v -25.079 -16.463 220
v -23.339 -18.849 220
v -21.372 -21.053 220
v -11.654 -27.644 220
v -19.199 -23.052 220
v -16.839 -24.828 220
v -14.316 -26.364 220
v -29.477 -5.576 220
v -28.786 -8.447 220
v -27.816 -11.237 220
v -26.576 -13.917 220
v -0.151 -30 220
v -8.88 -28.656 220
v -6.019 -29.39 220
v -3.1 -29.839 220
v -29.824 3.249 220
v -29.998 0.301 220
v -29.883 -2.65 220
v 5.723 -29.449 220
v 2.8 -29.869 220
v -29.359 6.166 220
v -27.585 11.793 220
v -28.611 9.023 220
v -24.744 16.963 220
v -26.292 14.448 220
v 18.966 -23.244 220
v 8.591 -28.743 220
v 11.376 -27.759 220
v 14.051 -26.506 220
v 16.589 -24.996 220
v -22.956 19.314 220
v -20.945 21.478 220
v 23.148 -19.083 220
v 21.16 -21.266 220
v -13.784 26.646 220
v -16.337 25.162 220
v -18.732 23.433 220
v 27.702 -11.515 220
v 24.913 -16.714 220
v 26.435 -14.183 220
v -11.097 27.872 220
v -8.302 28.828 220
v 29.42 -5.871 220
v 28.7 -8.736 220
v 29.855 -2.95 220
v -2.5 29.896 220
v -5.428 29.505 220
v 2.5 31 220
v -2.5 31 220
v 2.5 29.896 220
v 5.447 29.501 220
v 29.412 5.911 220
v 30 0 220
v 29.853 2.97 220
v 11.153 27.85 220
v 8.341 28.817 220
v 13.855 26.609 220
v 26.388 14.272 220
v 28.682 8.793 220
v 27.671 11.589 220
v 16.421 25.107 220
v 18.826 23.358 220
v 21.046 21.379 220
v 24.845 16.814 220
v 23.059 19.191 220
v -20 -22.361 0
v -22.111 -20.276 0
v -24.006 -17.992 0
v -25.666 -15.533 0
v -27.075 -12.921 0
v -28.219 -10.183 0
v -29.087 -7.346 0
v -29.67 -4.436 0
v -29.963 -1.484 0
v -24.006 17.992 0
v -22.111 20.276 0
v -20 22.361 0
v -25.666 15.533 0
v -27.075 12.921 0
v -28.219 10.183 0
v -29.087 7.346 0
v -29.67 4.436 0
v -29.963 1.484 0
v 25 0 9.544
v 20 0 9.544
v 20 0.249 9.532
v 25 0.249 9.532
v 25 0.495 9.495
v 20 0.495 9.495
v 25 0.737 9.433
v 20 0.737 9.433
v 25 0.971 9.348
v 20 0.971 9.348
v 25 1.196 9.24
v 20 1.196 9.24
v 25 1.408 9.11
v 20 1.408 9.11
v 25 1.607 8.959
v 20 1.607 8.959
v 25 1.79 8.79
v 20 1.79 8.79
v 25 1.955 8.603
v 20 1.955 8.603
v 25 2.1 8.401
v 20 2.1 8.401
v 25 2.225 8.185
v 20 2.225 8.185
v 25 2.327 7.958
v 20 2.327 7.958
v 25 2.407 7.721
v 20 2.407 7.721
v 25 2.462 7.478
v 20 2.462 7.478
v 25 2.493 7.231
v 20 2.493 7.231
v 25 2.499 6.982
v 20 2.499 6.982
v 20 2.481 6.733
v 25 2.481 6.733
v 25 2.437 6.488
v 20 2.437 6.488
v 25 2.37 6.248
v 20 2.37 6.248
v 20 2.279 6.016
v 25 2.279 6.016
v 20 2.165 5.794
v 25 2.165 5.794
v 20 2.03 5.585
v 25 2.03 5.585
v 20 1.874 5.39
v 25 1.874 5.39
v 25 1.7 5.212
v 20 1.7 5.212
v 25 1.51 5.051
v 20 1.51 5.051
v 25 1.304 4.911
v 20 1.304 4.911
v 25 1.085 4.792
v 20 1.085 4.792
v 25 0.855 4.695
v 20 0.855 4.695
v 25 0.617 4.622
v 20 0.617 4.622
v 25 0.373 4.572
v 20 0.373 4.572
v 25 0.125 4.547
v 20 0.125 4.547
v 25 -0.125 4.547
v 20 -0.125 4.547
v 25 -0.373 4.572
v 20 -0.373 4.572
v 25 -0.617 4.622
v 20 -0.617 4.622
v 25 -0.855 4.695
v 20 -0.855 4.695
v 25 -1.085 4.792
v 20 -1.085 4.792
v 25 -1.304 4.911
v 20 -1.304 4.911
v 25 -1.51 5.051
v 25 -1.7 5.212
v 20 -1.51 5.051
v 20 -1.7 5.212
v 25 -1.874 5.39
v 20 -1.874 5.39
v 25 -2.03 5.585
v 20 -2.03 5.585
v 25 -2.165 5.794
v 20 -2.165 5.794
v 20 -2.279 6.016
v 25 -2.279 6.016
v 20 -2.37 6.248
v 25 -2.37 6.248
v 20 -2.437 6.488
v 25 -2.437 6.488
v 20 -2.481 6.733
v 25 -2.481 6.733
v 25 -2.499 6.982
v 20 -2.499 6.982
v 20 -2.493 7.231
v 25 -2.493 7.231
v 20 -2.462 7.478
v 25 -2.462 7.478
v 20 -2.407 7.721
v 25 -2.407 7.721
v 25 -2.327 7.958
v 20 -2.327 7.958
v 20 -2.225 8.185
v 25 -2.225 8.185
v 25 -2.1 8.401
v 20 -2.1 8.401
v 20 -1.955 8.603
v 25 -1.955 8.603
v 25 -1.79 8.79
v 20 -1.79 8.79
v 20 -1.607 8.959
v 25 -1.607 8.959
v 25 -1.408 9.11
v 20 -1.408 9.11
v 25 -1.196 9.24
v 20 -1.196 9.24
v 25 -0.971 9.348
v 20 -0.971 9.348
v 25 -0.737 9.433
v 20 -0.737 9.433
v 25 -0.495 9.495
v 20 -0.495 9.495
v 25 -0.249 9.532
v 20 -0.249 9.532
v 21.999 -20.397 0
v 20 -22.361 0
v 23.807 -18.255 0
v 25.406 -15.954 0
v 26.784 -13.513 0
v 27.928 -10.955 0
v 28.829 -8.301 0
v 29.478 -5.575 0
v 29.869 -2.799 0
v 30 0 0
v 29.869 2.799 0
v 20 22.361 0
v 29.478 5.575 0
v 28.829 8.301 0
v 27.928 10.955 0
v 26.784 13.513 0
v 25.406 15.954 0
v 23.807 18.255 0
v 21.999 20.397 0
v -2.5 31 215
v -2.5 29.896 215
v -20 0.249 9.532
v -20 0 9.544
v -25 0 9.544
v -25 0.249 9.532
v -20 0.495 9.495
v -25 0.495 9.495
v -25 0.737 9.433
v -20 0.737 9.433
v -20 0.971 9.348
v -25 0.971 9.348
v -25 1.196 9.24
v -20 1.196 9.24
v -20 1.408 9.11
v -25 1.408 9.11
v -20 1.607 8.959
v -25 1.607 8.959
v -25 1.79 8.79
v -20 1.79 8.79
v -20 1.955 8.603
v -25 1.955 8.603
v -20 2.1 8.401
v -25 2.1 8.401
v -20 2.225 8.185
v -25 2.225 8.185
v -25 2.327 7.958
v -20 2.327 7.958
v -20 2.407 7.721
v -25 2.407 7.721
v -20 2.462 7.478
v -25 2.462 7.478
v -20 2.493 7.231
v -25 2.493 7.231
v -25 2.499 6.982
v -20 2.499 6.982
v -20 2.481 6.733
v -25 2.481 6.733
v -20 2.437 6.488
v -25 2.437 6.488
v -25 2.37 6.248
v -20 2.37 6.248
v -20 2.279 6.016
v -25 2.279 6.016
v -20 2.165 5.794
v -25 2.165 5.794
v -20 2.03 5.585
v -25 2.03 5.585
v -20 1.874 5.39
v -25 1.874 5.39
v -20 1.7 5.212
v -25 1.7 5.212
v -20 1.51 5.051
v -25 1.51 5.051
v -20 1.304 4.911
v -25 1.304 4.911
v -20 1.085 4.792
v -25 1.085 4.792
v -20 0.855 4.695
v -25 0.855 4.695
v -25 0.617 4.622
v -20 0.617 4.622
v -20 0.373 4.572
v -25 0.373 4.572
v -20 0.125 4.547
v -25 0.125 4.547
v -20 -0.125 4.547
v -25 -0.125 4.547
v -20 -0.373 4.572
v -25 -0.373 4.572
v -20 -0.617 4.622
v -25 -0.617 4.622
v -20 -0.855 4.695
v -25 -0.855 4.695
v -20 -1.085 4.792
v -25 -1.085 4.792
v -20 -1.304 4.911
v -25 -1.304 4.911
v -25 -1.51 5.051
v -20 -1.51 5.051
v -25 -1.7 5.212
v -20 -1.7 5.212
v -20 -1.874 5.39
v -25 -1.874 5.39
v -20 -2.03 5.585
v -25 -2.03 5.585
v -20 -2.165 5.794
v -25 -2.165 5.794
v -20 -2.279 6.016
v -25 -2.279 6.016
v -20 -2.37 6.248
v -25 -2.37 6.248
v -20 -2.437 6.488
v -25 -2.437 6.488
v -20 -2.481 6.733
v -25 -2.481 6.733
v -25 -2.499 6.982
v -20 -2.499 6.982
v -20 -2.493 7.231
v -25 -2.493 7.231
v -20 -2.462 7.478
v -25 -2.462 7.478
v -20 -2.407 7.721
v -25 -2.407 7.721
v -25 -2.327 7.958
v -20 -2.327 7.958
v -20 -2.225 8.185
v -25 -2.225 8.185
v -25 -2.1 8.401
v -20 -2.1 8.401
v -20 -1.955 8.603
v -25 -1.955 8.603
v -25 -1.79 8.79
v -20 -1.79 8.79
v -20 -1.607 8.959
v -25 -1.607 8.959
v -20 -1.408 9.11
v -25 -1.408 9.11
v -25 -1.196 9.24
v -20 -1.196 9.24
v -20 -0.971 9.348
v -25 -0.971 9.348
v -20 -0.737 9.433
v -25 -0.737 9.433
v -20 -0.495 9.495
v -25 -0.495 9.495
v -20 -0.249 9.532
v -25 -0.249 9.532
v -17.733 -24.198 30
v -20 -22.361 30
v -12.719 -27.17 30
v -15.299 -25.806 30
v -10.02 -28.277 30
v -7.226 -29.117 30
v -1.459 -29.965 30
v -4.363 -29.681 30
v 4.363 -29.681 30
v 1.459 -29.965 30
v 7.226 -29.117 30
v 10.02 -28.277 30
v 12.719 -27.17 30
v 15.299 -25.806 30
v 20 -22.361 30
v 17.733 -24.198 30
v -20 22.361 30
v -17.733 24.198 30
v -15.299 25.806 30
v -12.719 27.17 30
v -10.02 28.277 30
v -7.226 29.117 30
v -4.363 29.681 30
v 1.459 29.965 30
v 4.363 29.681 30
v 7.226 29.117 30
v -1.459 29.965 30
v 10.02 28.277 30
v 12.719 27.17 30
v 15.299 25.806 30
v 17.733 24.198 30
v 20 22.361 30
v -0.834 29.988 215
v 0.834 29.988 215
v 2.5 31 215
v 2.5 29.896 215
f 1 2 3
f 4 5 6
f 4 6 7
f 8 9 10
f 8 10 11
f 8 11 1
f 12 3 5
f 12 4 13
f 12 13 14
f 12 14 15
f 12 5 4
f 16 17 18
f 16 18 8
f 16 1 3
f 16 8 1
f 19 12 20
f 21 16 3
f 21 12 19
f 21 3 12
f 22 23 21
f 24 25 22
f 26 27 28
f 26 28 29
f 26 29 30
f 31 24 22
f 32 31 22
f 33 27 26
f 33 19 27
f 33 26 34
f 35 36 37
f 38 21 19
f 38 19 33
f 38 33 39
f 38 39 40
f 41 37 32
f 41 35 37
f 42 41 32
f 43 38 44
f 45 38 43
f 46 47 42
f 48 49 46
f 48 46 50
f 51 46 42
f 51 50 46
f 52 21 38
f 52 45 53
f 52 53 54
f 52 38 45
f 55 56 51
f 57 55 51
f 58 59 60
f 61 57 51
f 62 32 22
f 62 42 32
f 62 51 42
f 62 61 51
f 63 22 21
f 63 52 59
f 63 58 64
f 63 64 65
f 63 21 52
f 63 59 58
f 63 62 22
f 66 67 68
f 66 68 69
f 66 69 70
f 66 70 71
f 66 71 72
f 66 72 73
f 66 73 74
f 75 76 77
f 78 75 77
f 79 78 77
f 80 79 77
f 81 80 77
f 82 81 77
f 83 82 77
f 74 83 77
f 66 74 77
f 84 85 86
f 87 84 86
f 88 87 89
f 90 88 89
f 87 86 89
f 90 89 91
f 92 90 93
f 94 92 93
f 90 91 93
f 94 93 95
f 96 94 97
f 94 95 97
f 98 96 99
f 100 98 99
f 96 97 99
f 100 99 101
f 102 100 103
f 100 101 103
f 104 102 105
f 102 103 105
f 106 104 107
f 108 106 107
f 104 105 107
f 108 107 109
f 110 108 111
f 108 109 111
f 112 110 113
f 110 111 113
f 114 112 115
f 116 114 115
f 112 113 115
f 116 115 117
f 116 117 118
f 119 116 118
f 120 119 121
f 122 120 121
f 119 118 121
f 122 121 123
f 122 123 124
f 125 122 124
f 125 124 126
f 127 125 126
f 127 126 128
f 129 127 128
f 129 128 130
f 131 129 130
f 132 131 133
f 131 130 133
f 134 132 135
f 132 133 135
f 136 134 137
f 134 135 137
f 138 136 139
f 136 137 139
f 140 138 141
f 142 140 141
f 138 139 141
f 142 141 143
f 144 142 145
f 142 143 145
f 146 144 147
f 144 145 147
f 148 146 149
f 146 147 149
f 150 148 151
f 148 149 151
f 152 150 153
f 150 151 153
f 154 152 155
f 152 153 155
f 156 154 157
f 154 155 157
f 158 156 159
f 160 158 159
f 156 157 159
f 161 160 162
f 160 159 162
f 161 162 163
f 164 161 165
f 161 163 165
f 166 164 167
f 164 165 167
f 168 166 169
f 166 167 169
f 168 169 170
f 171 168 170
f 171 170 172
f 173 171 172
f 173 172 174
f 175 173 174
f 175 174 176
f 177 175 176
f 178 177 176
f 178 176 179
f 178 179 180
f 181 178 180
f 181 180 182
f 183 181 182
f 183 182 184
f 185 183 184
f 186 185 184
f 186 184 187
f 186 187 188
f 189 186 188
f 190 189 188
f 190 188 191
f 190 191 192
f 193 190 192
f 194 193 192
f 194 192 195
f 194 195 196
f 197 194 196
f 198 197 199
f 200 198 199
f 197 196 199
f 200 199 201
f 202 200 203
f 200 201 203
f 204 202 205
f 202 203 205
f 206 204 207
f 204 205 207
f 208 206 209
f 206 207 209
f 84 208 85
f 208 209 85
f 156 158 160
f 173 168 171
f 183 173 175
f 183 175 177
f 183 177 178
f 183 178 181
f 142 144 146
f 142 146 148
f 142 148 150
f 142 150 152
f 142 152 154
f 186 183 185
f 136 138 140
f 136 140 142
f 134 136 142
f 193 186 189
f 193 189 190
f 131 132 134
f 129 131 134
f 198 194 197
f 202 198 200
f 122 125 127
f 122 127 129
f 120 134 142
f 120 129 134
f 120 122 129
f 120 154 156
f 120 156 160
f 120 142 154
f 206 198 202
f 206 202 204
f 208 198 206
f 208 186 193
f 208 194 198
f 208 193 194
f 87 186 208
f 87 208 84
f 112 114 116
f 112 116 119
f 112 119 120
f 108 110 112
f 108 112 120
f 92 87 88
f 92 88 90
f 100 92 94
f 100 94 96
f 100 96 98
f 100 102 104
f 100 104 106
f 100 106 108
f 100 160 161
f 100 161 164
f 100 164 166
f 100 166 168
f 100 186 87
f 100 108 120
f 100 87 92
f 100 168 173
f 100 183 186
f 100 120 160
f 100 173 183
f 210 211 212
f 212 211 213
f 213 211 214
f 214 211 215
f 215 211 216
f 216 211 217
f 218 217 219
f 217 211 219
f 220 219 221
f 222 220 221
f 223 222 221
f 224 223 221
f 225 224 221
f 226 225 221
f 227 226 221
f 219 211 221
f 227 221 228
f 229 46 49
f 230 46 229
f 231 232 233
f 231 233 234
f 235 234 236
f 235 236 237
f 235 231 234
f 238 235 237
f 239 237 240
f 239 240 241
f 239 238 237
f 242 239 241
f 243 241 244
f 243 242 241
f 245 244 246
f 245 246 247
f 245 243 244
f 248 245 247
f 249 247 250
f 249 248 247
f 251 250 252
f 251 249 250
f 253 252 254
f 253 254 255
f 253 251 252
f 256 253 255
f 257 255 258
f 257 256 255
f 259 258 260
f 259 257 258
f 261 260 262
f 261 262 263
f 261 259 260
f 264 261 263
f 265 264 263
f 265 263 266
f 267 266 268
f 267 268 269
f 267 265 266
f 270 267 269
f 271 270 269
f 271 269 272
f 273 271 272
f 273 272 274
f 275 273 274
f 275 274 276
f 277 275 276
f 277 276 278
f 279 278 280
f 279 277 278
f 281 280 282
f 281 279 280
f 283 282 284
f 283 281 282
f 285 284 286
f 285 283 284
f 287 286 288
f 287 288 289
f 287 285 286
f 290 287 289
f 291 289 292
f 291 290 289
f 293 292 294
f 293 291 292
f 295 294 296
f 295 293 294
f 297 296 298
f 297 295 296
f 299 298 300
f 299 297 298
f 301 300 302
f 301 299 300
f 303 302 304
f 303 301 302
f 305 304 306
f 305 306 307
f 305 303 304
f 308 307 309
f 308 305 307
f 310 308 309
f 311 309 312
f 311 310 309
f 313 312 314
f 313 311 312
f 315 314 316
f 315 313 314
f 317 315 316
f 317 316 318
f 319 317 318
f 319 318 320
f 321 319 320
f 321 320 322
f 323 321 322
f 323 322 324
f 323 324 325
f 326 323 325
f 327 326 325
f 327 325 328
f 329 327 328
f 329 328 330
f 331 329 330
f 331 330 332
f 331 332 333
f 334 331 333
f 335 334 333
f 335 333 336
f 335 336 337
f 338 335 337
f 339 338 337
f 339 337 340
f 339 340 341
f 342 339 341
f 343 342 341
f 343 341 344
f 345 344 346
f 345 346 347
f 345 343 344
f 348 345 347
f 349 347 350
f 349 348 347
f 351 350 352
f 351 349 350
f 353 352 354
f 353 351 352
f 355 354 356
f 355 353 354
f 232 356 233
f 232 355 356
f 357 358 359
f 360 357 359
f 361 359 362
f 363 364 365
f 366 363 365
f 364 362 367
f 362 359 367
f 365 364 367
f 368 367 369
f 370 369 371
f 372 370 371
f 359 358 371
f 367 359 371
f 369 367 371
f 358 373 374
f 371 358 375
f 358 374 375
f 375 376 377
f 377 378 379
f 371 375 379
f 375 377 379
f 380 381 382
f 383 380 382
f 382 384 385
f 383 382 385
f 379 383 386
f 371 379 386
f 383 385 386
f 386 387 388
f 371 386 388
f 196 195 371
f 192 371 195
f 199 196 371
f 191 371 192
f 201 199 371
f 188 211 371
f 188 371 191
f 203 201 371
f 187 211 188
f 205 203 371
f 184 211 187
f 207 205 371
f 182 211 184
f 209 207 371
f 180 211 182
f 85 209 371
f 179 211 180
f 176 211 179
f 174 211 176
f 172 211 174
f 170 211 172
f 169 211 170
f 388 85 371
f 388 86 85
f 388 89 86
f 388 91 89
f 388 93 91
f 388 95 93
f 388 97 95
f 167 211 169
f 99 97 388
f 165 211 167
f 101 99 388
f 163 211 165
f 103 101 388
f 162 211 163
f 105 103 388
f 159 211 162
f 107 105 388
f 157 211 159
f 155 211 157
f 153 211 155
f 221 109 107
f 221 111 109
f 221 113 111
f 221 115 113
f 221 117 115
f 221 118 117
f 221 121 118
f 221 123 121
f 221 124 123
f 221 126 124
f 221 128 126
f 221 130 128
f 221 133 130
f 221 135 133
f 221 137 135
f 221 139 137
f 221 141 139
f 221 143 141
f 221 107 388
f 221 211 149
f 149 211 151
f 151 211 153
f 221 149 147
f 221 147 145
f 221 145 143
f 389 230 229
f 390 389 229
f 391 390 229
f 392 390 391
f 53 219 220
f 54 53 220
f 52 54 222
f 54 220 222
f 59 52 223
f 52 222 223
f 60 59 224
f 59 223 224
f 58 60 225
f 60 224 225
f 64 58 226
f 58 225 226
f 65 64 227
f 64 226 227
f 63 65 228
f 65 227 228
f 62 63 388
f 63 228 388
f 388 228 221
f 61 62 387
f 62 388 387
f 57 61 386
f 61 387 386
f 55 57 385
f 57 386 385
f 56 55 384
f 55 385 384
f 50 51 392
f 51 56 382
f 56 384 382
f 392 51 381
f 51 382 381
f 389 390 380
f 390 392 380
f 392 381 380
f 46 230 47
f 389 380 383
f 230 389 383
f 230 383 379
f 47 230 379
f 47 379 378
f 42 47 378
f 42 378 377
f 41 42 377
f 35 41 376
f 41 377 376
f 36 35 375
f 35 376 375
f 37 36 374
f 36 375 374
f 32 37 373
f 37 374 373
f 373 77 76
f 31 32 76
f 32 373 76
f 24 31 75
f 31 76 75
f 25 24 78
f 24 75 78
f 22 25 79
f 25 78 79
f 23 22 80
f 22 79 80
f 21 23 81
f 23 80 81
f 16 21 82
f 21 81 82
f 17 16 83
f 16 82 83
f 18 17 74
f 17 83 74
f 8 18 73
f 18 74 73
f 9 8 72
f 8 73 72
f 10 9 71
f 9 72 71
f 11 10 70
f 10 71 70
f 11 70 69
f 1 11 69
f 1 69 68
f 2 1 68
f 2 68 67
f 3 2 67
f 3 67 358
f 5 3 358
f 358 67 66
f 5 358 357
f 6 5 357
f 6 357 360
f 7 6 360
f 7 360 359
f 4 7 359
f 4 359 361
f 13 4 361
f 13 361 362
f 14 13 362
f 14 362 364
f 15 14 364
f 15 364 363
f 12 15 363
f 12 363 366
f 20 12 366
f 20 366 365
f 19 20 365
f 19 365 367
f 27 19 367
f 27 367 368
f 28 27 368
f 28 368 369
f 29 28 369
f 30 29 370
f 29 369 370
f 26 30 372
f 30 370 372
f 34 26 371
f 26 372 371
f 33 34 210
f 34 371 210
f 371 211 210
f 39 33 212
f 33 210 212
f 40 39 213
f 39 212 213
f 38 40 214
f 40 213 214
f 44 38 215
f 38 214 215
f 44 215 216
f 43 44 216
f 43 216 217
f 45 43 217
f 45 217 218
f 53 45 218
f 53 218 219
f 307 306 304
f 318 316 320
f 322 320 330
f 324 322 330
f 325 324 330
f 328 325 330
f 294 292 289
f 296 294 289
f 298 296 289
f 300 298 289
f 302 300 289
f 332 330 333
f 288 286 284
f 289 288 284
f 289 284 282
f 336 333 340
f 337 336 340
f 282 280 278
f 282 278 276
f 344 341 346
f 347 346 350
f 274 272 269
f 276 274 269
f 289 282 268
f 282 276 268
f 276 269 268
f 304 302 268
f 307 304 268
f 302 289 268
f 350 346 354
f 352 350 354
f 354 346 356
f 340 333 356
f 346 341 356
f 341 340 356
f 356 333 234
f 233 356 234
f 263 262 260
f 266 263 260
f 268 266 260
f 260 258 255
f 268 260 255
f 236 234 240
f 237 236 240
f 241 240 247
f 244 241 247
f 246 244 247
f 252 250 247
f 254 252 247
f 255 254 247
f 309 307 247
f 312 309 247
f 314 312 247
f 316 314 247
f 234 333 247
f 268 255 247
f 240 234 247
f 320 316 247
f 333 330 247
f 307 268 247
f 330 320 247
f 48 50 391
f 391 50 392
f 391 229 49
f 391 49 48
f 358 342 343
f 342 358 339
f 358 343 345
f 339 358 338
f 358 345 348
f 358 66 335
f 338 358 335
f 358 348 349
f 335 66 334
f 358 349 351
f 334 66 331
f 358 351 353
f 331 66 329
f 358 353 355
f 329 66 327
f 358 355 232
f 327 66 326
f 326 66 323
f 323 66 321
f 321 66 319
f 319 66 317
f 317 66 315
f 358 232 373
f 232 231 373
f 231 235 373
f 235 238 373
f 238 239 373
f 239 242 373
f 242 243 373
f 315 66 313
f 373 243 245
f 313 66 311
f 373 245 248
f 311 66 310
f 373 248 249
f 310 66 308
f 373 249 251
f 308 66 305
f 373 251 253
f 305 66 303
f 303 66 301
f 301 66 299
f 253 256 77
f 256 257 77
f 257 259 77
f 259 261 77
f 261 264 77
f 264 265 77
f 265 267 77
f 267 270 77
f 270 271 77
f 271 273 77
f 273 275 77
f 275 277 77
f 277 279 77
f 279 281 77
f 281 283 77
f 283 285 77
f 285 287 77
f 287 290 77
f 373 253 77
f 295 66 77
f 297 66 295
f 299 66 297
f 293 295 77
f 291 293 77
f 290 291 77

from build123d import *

# Parameters (mm, degrees)
SKETCH1_R           = 30
BOSS_EXTRUDE1_DEPTH = 220
SKETCH2_W           = 40
SKETCH2_H           = 60
CUT_EXTRUDE1_DEPTH  = 30
SKETCH3_R           = 2.5
CUT_EXTRUDE3_DEPTH  = 5
SKETCH4_W           = 5
SKETCH4_H           = 5
BOSS_EXTRUDE2_DEPTH = 31


with BuildPart() as part:
    # Sketch1 → Boss-Extrude1 (new body)
    with BuildSketch(Plane.XY):
        Circle(SKETCH1_R)
    extrude(amount=BOSS_EXTRUDE1_DEPTH)

    # Sketch2 → Cut-Extrude1 (cut)
    with BuildSketch(Plane.XY):
        Rectangle(SKETCH2_W, SKETCH2_H)
    extrude(amount=CUT_EXTRUDE1_DEPTH, mode=Mode.SUBTRACT)

    # Sketch3 → Cut-Extrude3 (cut)
    with BuildSketch(Plane.ZY.offset(-20)):
        with Locations((7.04424443, 0)):
            Circle(SKETCH3_R)
    cut_extrude3 = extrude(amount=-CUT_EXTRUDE3_DEPTH, mode=Mode.SUBTRACT)

    # Mirror1: Cut-Extrude3 across plane
    add(cut_extrude3.mirror(Plane.ZY), mode=Mode.SUBTRACT)

    # Sketch4 → Boss-Extrude2 (add)
    with BuildSketch(Plane(origin=(0, 0, 0), x_dir=(1, 0, 0), z_dir=(0, 1, 0))):
        with Locations((0, -217.5)):
            Rectangle(SKETCH4_W, SKETCH4_H)
    extrude(amount=BOSS_EXTRUDE2_DEPTH)


solid = part.part
